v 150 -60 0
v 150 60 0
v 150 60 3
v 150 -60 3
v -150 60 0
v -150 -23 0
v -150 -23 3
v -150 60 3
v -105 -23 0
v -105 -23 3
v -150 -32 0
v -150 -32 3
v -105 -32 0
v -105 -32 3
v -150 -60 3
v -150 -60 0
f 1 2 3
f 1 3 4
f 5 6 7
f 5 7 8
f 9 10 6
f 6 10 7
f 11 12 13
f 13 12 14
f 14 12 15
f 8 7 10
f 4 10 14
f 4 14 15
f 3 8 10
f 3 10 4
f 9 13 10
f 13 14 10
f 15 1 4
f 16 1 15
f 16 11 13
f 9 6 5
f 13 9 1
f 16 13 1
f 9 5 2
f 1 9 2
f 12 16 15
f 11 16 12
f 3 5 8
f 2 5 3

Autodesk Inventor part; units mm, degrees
ref_plane "YZ Plane" through (0, 0, 0) normal (1, 0, 0) x (0, 1, 0)
ref_plane "XZ Plane" through (0, 0, 0) normal (0, 1, 0) x (-1, 0, 0)
ref_plane "XY Plane" through (0, 0, 0) normal (0, 0, 1) x (1, 0, 0)
sketch "Sketch1" plane through (0, 0, 0) normal (0, 0, 1) x (1, 0, 0)
  line L0 (-150, 60) -> (150, 60)
  line L1 (150, 60) -> (150, -60)
  line L2 (150, -60) -> (-150, -60)
  line L3 (-150, -60) -> (-150, 60)
  line L4 (-150, 60) -> (150, -60) construction
  line L5 (150, 60) -> (-150, -60) construction
  point P0 (0, 0)
  dimension "d0" = 300
  dimension "d1" = 120
extrude "Extrusion1" add sketch "Sketch1" along normal blind 3
sketch "Sketch2" plane through (0, 0, 3) normal (0, 0, 1) x (1, 0, 0)
  line L0 (-150, -32) -> (-105, -32)
  line L1 (-105, -32) -> (-105, -23)
  line L2 (-105, -23) -> (-150, -23)
  line L3 (-150, -23) -> (-150, -32)
  point P0 (0, 0)
  dimension "d4" = 45
  dimension "d5" = 9
extrude "Extrusion2" cut sketch "Sketch2" against normal up to surface (3 mm away)
properties part number "base_01[1]"
